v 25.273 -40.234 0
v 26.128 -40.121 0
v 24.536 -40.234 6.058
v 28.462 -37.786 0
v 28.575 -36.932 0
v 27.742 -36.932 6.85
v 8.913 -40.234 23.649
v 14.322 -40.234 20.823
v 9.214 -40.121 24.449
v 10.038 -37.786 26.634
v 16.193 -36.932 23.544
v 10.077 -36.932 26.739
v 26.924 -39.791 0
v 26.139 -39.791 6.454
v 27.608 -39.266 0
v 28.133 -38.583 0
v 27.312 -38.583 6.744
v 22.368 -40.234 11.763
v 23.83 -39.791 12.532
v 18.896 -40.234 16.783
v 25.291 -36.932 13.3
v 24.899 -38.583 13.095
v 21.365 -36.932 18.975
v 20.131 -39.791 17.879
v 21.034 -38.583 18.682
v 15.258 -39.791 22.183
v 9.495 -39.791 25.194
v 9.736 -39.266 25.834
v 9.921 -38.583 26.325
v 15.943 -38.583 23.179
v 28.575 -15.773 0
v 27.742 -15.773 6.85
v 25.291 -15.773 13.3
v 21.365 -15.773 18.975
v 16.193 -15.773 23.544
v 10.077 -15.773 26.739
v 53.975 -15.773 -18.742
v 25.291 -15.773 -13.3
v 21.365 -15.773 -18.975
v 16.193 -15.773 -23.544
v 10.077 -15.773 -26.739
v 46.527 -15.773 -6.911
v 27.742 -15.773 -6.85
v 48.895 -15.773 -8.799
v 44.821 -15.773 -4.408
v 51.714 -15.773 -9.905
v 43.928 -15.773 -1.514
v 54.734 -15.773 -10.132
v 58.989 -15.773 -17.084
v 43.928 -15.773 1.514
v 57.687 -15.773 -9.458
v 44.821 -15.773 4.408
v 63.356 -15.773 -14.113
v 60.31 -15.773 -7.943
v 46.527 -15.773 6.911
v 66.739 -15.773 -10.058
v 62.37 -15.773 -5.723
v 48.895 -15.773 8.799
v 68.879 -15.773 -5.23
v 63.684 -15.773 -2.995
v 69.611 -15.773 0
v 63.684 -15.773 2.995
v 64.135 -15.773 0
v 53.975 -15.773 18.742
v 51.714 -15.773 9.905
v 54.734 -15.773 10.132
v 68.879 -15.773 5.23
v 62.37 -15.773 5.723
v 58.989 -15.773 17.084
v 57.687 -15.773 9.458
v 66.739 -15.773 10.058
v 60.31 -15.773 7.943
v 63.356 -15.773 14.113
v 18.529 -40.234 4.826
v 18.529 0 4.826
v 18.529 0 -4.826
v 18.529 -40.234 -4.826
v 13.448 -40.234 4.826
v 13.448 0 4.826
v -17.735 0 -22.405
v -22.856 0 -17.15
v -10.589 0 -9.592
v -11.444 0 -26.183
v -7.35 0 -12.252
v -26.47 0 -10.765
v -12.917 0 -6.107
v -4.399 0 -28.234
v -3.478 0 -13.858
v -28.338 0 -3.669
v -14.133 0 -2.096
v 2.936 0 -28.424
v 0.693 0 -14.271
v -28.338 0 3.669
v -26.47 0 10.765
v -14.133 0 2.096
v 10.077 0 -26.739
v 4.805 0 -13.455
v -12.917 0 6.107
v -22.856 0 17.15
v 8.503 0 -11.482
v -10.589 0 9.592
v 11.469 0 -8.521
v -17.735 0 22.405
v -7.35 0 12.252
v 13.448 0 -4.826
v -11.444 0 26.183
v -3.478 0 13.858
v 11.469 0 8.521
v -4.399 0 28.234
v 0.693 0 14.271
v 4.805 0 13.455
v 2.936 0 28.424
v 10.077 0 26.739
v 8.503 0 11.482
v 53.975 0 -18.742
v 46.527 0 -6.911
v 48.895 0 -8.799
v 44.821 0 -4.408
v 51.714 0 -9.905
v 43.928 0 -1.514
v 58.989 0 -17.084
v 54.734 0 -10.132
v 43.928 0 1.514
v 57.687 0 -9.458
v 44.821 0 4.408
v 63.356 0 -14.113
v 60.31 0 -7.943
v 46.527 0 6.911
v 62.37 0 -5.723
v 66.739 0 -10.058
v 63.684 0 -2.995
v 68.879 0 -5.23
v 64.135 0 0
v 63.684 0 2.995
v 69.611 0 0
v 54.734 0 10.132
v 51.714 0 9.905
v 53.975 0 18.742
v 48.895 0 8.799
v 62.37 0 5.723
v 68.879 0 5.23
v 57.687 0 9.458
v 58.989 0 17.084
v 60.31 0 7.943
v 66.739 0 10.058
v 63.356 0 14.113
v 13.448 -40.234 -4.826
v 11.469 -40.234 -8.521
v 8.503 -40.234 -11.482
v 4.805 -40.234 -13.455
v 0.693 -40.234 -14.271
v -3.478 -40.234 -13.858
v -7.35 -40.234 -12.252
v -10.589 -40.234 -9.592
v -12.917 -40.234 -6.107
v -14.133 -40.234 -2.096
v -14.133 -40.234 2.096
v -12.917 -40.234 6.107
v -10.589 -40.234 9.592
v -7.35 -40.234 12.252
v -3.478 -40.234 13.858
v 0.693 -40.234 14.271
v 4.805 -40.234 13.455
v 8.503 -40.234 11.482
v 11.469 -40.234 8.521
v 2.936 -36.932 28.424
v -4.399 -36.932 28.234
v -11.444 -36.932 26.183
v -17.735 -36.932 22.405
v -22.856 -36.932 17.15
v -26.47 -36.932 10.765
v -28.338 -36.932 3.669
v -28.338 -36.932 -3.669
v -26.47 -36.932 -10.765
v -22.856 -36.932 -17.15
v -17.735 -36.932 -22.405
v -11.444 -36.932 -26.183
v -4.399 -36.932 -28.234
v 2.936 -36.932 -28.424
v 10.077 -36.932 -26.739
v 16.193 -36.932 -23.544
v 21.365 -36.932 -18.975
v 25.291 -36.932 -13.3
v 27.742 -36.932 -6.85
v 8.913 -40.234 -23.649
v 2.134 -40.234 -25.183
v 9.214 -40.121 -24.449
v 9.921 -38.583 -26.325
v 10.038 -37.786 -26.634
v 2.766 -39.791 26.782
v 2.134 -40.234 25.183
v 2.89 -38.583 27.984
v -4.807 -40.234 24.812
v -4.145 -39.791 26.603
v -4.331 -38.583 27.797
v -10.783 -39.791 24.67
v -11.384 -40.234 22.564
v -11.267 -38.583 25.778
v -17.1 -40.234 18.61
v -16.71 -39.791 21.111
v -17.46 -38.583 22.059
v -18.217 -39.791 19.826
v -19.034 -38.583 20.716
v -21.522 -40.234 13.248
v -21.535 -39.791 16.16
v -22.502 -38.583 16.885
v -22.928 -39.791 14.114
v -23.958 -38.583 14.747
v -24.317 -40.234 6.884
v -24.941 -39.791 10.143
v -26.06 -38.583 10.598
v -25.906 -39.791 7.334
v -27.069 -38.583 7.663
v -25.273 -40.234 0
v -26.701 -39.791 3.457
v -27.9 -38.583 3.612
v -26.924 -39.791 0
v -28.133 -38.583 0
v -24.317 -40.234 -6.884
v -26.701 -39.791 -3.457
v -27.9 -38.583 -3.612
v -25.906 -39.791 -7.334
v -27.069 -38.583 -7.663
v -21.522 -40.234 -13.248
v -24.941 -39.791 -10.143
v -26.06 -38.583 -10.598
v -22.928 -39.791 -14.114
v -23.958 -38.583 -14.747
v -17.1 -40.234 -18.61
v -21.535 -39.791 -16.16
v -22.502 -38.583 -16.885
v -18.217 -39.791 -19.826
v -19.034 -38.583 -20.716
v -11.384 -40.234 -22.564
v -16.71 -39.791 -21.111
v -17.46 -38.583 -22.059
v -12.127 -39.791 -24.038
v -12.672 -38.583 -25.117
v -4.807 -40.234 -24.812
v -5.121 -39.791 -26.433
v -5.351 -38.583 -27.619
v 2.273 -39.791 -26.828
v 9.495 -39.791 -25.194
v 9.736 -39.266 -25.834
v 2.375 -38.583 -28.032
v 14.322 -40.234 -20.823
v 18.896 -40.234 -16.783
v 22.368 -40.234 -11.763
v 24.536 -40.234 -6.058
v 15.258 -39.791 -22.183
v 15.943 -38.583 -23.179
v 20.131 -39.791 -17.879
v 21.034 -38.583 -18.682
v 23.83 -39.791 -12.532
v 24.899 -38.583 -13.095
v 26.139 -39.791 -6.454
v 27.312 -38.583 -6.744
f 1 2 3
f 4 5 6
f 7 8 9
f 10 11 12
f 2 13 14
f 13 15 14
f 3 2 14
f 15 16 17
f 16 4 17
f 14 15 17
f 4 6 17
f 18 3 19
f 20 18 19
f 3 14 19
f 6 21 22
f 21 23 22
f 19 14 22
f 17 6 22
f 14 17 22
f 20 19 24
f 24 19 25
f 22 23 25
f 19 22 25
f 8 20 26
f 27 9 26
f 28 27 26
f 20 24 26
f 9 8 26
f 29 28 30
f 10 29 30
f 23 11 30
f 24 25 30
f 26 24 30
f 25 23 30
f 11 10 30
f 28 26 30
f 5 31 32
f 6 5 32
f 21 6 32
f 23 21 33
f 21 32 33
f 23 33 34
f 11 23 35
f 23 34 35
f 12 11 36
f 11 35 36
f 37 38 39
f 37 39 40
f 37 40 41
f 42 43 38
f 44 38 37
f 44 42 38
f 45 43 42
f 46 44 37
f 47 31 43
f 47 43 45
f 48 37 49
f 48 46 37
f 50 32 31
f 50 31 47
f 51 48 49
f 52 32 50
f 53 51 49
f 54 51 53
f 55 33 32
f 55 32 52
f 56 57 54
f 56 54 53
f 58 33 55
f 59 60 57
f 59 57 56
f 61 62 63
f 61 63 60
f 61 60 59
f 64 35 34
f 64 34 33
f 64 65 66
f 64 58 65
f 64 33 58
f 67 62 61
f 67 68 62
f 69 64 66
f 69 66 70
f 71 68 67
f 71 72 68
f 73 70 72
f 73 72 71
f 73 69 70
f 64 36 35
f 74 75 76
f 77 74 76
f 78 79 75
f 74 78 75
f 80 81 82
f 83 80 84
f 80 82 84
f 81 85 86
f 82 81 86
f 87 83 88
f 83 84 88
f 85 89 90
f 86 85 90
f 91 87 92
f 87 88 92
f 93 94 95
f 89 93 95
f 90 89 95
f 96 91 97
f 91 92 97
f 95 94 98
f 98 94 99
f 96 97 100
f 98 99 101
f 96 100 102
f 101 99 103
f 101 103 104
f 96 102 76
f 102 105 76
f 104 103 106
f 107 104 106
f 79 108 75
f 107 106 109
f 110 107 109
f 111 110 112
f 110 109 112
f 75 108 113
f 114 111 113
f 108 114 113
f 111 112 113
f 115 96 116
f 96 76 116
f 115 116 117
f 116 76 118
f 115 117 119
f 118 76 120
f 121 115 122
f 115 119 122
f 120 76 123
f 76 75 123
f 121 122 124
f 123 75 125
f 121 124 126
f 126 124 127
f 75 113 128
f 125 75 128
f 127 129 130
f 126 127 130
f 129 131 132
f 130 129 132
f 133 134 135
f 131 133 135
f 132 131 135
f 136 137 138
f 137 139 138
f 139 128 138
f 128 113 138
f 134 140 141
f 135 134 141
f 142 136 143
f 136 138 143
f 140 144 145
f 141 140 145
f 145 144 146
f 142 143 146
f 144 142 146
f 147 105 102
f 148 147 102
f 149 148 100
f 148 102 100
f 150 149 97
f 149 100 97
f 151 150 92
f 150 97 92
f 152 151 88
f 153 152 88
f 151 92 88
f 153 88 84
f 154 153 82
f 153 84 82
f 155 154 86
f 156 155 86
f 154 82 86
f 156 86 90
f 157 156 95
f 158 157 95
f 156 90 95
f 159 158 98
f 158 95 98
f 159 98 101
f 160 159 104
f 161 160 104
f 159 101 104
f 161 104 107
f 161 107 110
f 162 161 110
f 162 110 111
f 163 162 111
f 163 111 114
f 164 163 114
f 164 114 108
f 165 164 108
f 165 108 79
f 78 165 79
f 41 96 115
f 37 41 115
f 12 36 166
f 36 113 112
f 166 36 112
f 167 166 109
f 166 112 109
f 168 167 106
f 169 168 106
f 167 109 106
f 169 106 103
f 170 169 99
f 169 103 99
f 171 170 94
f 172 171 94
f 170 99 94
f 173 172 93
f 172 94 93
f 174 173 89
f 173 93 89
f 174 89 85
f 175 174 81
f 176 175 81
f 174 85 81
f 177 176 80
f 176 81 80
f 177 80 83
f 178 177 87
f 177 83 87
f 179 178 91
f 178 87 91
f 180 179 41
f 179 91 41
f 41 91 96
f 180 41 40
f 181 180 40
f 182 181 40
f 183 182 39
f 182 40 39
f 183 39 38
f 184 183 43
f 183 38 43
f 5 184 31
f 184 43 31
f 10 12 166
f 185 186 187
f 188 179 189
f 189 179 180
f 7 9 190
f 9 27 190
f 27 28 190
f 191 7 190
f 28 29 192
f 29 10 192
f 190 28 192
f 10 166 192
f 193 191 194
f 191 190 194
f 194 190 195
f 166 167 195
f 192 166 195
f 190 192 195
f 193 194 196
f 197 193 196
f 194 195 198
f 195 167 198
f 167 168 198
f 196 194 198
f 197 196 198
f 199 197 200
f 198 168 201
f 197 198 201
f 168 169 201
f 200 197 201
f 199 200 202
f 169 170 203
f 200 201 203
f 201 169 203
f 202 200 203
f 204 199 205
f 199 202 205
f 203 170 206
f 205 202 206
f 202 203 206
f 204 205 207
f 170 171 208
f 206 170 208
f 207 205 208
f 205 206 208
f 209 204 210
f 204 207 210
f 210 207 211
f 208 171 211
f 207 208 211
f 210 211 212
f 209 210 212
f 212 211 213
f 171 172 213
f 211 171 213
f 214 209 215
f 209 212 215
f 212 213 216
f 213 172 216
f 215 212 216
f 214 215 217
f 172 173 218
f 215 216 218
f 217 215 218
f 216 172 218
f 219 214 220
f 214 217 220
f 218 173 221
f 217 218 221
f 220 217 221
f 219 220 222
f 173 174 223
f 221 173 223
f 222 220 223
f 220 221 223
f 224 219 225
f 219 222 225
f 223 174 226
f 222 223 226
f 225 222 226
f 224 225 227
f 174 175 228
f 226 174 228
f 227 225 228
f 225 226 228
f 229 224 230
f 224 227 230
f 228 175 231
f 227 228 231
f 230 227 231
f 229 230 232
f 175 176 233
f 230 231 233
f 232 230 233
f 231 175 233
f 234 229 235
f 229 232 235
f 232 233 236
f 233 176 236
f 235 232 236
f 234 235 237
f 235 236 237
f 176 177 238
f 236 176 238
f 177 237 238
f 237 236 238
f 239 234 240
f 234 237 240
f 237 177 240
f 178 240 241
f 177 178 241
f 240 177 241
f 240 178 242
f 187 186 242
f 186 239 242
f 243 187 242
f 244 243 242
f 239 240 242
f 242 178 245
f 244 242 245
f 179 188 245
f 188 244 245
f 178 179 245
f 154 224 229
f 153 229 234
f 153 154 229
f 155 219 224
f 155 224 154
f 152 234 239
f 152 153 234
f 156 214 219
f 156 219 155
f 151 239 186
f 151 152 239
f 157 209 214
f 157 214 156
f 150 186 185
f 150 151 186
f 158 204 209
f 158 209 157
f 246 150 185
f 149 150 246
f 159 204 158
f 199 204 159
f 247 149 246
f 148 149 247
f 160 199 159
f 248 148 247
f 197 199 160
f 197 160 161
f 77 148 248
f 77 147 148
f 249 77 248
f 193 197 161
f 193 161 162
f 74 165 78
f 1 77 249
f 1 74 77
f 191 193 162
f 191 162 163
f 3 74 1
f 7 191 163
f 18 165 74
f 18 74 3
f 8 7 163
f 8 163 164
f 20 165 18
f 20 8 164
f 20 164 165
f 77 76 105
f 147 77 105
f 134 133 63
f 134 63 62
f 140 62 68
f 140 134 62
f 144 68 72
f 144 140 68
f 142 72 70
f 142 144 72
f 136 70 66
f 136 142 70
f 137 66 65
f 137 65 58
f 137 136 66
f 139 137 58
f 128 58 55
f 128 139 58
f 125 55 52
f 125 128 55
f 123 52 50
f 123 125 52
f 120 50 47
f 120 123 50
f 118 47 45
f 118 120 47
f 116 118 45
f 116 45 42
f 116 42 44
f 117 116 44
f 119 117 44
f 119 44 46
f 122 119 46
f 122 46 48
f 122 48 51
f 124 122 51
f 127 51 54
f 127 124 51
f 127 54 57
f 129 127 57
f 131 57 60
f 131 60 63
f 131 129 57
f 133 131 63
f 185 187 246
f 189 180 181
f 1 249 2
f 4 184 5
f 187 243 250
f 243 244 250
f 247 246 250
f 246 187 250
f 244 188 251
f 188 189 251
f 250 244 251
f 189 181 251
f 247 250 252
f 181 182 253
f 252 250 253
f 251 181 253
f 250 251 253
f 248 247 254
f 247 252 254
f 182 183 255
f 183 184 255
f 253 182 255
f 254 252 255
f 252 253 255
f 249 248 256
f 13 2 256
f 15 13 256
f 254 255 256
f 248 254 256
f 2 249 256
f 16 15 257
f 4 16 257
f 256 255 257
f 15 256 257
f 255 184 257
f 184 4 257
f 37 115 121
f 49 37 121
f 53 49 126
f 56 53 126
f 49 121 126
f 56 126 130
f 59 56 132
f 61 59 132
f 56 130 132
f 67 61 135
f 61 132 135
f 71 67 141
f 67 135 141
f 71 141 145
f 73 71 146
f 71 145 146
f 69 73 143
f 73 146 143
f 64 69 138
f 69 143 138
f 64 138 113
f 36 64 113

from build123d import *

# Parameters (mm, degrees)
F0_R     = 10.16
F1_DEPTH = 15.7734
F2_DEPTH = 40.2336
F3_R     = 3.302


with BuildPart() as f1:
    # F0 (on Front) → F1 (new body)
    with BuildSketch(Plane.XZ):
        with BuildLine():
            ThreePointArc((10.077445, 26.73903), (23.499932, 16.256808), (28.575, 0))
            ThreePointArc((28.575, 0), (23.499932, -16.256808), (10.077445, -26.73903))
            Line((10.077445, -26.73903), (53.975, -18.741507))
            ThreePointArc((53.975, -18.741507), (69.610559, 0), (53.975, 18.741507))
            Line((53.975, 18.741507), (10.077445, 26.73903))
        make_face()
        with Locations((53.975, 0)):
            Circle(F0_R, mode=Mode.SUBTRACT)
    extrude(amount=F1_DEPTH)

    # F0 (on Front) → F2 (join)
    with BuildSketch(Plane.XZ):
        with BuildLine():
            ThreePointArc((10.077445, -26.73903), (23.499932, -16.256808), (28.575, 0))
            ThreePointArc((28.575, 0), (23.499932, 16.256808), (10.077445, 26.73903))
            ThreePointArc((10.077445, 26.73903), (-28.575, 0), (10.077445, -26.73903))
        make_face()
        with BuildLine():
            ThreePointArc((13.447765, -4.826), (-14.2875, 0), (13.447765, 4.826))
            Line((13.447765, 4.826), (18.5293, 4.826))
            Line((18.5293, 4.826), (18.5293, -4.826))
            Line((18.5293, -4.826), (13.447765, -4.826))
        make_face(mode=Mode.SUBTRACT)
    extrude(amount=F2_DEPTH)

    # F3
    f3_edges = [f1.edges().sort_by_distance(p)[0] for p in [
        (-10.077445, -40.2336, 26.73903),
    ]]
    fillet(f3_edges, radius=F3_R)


solid = f1.part
